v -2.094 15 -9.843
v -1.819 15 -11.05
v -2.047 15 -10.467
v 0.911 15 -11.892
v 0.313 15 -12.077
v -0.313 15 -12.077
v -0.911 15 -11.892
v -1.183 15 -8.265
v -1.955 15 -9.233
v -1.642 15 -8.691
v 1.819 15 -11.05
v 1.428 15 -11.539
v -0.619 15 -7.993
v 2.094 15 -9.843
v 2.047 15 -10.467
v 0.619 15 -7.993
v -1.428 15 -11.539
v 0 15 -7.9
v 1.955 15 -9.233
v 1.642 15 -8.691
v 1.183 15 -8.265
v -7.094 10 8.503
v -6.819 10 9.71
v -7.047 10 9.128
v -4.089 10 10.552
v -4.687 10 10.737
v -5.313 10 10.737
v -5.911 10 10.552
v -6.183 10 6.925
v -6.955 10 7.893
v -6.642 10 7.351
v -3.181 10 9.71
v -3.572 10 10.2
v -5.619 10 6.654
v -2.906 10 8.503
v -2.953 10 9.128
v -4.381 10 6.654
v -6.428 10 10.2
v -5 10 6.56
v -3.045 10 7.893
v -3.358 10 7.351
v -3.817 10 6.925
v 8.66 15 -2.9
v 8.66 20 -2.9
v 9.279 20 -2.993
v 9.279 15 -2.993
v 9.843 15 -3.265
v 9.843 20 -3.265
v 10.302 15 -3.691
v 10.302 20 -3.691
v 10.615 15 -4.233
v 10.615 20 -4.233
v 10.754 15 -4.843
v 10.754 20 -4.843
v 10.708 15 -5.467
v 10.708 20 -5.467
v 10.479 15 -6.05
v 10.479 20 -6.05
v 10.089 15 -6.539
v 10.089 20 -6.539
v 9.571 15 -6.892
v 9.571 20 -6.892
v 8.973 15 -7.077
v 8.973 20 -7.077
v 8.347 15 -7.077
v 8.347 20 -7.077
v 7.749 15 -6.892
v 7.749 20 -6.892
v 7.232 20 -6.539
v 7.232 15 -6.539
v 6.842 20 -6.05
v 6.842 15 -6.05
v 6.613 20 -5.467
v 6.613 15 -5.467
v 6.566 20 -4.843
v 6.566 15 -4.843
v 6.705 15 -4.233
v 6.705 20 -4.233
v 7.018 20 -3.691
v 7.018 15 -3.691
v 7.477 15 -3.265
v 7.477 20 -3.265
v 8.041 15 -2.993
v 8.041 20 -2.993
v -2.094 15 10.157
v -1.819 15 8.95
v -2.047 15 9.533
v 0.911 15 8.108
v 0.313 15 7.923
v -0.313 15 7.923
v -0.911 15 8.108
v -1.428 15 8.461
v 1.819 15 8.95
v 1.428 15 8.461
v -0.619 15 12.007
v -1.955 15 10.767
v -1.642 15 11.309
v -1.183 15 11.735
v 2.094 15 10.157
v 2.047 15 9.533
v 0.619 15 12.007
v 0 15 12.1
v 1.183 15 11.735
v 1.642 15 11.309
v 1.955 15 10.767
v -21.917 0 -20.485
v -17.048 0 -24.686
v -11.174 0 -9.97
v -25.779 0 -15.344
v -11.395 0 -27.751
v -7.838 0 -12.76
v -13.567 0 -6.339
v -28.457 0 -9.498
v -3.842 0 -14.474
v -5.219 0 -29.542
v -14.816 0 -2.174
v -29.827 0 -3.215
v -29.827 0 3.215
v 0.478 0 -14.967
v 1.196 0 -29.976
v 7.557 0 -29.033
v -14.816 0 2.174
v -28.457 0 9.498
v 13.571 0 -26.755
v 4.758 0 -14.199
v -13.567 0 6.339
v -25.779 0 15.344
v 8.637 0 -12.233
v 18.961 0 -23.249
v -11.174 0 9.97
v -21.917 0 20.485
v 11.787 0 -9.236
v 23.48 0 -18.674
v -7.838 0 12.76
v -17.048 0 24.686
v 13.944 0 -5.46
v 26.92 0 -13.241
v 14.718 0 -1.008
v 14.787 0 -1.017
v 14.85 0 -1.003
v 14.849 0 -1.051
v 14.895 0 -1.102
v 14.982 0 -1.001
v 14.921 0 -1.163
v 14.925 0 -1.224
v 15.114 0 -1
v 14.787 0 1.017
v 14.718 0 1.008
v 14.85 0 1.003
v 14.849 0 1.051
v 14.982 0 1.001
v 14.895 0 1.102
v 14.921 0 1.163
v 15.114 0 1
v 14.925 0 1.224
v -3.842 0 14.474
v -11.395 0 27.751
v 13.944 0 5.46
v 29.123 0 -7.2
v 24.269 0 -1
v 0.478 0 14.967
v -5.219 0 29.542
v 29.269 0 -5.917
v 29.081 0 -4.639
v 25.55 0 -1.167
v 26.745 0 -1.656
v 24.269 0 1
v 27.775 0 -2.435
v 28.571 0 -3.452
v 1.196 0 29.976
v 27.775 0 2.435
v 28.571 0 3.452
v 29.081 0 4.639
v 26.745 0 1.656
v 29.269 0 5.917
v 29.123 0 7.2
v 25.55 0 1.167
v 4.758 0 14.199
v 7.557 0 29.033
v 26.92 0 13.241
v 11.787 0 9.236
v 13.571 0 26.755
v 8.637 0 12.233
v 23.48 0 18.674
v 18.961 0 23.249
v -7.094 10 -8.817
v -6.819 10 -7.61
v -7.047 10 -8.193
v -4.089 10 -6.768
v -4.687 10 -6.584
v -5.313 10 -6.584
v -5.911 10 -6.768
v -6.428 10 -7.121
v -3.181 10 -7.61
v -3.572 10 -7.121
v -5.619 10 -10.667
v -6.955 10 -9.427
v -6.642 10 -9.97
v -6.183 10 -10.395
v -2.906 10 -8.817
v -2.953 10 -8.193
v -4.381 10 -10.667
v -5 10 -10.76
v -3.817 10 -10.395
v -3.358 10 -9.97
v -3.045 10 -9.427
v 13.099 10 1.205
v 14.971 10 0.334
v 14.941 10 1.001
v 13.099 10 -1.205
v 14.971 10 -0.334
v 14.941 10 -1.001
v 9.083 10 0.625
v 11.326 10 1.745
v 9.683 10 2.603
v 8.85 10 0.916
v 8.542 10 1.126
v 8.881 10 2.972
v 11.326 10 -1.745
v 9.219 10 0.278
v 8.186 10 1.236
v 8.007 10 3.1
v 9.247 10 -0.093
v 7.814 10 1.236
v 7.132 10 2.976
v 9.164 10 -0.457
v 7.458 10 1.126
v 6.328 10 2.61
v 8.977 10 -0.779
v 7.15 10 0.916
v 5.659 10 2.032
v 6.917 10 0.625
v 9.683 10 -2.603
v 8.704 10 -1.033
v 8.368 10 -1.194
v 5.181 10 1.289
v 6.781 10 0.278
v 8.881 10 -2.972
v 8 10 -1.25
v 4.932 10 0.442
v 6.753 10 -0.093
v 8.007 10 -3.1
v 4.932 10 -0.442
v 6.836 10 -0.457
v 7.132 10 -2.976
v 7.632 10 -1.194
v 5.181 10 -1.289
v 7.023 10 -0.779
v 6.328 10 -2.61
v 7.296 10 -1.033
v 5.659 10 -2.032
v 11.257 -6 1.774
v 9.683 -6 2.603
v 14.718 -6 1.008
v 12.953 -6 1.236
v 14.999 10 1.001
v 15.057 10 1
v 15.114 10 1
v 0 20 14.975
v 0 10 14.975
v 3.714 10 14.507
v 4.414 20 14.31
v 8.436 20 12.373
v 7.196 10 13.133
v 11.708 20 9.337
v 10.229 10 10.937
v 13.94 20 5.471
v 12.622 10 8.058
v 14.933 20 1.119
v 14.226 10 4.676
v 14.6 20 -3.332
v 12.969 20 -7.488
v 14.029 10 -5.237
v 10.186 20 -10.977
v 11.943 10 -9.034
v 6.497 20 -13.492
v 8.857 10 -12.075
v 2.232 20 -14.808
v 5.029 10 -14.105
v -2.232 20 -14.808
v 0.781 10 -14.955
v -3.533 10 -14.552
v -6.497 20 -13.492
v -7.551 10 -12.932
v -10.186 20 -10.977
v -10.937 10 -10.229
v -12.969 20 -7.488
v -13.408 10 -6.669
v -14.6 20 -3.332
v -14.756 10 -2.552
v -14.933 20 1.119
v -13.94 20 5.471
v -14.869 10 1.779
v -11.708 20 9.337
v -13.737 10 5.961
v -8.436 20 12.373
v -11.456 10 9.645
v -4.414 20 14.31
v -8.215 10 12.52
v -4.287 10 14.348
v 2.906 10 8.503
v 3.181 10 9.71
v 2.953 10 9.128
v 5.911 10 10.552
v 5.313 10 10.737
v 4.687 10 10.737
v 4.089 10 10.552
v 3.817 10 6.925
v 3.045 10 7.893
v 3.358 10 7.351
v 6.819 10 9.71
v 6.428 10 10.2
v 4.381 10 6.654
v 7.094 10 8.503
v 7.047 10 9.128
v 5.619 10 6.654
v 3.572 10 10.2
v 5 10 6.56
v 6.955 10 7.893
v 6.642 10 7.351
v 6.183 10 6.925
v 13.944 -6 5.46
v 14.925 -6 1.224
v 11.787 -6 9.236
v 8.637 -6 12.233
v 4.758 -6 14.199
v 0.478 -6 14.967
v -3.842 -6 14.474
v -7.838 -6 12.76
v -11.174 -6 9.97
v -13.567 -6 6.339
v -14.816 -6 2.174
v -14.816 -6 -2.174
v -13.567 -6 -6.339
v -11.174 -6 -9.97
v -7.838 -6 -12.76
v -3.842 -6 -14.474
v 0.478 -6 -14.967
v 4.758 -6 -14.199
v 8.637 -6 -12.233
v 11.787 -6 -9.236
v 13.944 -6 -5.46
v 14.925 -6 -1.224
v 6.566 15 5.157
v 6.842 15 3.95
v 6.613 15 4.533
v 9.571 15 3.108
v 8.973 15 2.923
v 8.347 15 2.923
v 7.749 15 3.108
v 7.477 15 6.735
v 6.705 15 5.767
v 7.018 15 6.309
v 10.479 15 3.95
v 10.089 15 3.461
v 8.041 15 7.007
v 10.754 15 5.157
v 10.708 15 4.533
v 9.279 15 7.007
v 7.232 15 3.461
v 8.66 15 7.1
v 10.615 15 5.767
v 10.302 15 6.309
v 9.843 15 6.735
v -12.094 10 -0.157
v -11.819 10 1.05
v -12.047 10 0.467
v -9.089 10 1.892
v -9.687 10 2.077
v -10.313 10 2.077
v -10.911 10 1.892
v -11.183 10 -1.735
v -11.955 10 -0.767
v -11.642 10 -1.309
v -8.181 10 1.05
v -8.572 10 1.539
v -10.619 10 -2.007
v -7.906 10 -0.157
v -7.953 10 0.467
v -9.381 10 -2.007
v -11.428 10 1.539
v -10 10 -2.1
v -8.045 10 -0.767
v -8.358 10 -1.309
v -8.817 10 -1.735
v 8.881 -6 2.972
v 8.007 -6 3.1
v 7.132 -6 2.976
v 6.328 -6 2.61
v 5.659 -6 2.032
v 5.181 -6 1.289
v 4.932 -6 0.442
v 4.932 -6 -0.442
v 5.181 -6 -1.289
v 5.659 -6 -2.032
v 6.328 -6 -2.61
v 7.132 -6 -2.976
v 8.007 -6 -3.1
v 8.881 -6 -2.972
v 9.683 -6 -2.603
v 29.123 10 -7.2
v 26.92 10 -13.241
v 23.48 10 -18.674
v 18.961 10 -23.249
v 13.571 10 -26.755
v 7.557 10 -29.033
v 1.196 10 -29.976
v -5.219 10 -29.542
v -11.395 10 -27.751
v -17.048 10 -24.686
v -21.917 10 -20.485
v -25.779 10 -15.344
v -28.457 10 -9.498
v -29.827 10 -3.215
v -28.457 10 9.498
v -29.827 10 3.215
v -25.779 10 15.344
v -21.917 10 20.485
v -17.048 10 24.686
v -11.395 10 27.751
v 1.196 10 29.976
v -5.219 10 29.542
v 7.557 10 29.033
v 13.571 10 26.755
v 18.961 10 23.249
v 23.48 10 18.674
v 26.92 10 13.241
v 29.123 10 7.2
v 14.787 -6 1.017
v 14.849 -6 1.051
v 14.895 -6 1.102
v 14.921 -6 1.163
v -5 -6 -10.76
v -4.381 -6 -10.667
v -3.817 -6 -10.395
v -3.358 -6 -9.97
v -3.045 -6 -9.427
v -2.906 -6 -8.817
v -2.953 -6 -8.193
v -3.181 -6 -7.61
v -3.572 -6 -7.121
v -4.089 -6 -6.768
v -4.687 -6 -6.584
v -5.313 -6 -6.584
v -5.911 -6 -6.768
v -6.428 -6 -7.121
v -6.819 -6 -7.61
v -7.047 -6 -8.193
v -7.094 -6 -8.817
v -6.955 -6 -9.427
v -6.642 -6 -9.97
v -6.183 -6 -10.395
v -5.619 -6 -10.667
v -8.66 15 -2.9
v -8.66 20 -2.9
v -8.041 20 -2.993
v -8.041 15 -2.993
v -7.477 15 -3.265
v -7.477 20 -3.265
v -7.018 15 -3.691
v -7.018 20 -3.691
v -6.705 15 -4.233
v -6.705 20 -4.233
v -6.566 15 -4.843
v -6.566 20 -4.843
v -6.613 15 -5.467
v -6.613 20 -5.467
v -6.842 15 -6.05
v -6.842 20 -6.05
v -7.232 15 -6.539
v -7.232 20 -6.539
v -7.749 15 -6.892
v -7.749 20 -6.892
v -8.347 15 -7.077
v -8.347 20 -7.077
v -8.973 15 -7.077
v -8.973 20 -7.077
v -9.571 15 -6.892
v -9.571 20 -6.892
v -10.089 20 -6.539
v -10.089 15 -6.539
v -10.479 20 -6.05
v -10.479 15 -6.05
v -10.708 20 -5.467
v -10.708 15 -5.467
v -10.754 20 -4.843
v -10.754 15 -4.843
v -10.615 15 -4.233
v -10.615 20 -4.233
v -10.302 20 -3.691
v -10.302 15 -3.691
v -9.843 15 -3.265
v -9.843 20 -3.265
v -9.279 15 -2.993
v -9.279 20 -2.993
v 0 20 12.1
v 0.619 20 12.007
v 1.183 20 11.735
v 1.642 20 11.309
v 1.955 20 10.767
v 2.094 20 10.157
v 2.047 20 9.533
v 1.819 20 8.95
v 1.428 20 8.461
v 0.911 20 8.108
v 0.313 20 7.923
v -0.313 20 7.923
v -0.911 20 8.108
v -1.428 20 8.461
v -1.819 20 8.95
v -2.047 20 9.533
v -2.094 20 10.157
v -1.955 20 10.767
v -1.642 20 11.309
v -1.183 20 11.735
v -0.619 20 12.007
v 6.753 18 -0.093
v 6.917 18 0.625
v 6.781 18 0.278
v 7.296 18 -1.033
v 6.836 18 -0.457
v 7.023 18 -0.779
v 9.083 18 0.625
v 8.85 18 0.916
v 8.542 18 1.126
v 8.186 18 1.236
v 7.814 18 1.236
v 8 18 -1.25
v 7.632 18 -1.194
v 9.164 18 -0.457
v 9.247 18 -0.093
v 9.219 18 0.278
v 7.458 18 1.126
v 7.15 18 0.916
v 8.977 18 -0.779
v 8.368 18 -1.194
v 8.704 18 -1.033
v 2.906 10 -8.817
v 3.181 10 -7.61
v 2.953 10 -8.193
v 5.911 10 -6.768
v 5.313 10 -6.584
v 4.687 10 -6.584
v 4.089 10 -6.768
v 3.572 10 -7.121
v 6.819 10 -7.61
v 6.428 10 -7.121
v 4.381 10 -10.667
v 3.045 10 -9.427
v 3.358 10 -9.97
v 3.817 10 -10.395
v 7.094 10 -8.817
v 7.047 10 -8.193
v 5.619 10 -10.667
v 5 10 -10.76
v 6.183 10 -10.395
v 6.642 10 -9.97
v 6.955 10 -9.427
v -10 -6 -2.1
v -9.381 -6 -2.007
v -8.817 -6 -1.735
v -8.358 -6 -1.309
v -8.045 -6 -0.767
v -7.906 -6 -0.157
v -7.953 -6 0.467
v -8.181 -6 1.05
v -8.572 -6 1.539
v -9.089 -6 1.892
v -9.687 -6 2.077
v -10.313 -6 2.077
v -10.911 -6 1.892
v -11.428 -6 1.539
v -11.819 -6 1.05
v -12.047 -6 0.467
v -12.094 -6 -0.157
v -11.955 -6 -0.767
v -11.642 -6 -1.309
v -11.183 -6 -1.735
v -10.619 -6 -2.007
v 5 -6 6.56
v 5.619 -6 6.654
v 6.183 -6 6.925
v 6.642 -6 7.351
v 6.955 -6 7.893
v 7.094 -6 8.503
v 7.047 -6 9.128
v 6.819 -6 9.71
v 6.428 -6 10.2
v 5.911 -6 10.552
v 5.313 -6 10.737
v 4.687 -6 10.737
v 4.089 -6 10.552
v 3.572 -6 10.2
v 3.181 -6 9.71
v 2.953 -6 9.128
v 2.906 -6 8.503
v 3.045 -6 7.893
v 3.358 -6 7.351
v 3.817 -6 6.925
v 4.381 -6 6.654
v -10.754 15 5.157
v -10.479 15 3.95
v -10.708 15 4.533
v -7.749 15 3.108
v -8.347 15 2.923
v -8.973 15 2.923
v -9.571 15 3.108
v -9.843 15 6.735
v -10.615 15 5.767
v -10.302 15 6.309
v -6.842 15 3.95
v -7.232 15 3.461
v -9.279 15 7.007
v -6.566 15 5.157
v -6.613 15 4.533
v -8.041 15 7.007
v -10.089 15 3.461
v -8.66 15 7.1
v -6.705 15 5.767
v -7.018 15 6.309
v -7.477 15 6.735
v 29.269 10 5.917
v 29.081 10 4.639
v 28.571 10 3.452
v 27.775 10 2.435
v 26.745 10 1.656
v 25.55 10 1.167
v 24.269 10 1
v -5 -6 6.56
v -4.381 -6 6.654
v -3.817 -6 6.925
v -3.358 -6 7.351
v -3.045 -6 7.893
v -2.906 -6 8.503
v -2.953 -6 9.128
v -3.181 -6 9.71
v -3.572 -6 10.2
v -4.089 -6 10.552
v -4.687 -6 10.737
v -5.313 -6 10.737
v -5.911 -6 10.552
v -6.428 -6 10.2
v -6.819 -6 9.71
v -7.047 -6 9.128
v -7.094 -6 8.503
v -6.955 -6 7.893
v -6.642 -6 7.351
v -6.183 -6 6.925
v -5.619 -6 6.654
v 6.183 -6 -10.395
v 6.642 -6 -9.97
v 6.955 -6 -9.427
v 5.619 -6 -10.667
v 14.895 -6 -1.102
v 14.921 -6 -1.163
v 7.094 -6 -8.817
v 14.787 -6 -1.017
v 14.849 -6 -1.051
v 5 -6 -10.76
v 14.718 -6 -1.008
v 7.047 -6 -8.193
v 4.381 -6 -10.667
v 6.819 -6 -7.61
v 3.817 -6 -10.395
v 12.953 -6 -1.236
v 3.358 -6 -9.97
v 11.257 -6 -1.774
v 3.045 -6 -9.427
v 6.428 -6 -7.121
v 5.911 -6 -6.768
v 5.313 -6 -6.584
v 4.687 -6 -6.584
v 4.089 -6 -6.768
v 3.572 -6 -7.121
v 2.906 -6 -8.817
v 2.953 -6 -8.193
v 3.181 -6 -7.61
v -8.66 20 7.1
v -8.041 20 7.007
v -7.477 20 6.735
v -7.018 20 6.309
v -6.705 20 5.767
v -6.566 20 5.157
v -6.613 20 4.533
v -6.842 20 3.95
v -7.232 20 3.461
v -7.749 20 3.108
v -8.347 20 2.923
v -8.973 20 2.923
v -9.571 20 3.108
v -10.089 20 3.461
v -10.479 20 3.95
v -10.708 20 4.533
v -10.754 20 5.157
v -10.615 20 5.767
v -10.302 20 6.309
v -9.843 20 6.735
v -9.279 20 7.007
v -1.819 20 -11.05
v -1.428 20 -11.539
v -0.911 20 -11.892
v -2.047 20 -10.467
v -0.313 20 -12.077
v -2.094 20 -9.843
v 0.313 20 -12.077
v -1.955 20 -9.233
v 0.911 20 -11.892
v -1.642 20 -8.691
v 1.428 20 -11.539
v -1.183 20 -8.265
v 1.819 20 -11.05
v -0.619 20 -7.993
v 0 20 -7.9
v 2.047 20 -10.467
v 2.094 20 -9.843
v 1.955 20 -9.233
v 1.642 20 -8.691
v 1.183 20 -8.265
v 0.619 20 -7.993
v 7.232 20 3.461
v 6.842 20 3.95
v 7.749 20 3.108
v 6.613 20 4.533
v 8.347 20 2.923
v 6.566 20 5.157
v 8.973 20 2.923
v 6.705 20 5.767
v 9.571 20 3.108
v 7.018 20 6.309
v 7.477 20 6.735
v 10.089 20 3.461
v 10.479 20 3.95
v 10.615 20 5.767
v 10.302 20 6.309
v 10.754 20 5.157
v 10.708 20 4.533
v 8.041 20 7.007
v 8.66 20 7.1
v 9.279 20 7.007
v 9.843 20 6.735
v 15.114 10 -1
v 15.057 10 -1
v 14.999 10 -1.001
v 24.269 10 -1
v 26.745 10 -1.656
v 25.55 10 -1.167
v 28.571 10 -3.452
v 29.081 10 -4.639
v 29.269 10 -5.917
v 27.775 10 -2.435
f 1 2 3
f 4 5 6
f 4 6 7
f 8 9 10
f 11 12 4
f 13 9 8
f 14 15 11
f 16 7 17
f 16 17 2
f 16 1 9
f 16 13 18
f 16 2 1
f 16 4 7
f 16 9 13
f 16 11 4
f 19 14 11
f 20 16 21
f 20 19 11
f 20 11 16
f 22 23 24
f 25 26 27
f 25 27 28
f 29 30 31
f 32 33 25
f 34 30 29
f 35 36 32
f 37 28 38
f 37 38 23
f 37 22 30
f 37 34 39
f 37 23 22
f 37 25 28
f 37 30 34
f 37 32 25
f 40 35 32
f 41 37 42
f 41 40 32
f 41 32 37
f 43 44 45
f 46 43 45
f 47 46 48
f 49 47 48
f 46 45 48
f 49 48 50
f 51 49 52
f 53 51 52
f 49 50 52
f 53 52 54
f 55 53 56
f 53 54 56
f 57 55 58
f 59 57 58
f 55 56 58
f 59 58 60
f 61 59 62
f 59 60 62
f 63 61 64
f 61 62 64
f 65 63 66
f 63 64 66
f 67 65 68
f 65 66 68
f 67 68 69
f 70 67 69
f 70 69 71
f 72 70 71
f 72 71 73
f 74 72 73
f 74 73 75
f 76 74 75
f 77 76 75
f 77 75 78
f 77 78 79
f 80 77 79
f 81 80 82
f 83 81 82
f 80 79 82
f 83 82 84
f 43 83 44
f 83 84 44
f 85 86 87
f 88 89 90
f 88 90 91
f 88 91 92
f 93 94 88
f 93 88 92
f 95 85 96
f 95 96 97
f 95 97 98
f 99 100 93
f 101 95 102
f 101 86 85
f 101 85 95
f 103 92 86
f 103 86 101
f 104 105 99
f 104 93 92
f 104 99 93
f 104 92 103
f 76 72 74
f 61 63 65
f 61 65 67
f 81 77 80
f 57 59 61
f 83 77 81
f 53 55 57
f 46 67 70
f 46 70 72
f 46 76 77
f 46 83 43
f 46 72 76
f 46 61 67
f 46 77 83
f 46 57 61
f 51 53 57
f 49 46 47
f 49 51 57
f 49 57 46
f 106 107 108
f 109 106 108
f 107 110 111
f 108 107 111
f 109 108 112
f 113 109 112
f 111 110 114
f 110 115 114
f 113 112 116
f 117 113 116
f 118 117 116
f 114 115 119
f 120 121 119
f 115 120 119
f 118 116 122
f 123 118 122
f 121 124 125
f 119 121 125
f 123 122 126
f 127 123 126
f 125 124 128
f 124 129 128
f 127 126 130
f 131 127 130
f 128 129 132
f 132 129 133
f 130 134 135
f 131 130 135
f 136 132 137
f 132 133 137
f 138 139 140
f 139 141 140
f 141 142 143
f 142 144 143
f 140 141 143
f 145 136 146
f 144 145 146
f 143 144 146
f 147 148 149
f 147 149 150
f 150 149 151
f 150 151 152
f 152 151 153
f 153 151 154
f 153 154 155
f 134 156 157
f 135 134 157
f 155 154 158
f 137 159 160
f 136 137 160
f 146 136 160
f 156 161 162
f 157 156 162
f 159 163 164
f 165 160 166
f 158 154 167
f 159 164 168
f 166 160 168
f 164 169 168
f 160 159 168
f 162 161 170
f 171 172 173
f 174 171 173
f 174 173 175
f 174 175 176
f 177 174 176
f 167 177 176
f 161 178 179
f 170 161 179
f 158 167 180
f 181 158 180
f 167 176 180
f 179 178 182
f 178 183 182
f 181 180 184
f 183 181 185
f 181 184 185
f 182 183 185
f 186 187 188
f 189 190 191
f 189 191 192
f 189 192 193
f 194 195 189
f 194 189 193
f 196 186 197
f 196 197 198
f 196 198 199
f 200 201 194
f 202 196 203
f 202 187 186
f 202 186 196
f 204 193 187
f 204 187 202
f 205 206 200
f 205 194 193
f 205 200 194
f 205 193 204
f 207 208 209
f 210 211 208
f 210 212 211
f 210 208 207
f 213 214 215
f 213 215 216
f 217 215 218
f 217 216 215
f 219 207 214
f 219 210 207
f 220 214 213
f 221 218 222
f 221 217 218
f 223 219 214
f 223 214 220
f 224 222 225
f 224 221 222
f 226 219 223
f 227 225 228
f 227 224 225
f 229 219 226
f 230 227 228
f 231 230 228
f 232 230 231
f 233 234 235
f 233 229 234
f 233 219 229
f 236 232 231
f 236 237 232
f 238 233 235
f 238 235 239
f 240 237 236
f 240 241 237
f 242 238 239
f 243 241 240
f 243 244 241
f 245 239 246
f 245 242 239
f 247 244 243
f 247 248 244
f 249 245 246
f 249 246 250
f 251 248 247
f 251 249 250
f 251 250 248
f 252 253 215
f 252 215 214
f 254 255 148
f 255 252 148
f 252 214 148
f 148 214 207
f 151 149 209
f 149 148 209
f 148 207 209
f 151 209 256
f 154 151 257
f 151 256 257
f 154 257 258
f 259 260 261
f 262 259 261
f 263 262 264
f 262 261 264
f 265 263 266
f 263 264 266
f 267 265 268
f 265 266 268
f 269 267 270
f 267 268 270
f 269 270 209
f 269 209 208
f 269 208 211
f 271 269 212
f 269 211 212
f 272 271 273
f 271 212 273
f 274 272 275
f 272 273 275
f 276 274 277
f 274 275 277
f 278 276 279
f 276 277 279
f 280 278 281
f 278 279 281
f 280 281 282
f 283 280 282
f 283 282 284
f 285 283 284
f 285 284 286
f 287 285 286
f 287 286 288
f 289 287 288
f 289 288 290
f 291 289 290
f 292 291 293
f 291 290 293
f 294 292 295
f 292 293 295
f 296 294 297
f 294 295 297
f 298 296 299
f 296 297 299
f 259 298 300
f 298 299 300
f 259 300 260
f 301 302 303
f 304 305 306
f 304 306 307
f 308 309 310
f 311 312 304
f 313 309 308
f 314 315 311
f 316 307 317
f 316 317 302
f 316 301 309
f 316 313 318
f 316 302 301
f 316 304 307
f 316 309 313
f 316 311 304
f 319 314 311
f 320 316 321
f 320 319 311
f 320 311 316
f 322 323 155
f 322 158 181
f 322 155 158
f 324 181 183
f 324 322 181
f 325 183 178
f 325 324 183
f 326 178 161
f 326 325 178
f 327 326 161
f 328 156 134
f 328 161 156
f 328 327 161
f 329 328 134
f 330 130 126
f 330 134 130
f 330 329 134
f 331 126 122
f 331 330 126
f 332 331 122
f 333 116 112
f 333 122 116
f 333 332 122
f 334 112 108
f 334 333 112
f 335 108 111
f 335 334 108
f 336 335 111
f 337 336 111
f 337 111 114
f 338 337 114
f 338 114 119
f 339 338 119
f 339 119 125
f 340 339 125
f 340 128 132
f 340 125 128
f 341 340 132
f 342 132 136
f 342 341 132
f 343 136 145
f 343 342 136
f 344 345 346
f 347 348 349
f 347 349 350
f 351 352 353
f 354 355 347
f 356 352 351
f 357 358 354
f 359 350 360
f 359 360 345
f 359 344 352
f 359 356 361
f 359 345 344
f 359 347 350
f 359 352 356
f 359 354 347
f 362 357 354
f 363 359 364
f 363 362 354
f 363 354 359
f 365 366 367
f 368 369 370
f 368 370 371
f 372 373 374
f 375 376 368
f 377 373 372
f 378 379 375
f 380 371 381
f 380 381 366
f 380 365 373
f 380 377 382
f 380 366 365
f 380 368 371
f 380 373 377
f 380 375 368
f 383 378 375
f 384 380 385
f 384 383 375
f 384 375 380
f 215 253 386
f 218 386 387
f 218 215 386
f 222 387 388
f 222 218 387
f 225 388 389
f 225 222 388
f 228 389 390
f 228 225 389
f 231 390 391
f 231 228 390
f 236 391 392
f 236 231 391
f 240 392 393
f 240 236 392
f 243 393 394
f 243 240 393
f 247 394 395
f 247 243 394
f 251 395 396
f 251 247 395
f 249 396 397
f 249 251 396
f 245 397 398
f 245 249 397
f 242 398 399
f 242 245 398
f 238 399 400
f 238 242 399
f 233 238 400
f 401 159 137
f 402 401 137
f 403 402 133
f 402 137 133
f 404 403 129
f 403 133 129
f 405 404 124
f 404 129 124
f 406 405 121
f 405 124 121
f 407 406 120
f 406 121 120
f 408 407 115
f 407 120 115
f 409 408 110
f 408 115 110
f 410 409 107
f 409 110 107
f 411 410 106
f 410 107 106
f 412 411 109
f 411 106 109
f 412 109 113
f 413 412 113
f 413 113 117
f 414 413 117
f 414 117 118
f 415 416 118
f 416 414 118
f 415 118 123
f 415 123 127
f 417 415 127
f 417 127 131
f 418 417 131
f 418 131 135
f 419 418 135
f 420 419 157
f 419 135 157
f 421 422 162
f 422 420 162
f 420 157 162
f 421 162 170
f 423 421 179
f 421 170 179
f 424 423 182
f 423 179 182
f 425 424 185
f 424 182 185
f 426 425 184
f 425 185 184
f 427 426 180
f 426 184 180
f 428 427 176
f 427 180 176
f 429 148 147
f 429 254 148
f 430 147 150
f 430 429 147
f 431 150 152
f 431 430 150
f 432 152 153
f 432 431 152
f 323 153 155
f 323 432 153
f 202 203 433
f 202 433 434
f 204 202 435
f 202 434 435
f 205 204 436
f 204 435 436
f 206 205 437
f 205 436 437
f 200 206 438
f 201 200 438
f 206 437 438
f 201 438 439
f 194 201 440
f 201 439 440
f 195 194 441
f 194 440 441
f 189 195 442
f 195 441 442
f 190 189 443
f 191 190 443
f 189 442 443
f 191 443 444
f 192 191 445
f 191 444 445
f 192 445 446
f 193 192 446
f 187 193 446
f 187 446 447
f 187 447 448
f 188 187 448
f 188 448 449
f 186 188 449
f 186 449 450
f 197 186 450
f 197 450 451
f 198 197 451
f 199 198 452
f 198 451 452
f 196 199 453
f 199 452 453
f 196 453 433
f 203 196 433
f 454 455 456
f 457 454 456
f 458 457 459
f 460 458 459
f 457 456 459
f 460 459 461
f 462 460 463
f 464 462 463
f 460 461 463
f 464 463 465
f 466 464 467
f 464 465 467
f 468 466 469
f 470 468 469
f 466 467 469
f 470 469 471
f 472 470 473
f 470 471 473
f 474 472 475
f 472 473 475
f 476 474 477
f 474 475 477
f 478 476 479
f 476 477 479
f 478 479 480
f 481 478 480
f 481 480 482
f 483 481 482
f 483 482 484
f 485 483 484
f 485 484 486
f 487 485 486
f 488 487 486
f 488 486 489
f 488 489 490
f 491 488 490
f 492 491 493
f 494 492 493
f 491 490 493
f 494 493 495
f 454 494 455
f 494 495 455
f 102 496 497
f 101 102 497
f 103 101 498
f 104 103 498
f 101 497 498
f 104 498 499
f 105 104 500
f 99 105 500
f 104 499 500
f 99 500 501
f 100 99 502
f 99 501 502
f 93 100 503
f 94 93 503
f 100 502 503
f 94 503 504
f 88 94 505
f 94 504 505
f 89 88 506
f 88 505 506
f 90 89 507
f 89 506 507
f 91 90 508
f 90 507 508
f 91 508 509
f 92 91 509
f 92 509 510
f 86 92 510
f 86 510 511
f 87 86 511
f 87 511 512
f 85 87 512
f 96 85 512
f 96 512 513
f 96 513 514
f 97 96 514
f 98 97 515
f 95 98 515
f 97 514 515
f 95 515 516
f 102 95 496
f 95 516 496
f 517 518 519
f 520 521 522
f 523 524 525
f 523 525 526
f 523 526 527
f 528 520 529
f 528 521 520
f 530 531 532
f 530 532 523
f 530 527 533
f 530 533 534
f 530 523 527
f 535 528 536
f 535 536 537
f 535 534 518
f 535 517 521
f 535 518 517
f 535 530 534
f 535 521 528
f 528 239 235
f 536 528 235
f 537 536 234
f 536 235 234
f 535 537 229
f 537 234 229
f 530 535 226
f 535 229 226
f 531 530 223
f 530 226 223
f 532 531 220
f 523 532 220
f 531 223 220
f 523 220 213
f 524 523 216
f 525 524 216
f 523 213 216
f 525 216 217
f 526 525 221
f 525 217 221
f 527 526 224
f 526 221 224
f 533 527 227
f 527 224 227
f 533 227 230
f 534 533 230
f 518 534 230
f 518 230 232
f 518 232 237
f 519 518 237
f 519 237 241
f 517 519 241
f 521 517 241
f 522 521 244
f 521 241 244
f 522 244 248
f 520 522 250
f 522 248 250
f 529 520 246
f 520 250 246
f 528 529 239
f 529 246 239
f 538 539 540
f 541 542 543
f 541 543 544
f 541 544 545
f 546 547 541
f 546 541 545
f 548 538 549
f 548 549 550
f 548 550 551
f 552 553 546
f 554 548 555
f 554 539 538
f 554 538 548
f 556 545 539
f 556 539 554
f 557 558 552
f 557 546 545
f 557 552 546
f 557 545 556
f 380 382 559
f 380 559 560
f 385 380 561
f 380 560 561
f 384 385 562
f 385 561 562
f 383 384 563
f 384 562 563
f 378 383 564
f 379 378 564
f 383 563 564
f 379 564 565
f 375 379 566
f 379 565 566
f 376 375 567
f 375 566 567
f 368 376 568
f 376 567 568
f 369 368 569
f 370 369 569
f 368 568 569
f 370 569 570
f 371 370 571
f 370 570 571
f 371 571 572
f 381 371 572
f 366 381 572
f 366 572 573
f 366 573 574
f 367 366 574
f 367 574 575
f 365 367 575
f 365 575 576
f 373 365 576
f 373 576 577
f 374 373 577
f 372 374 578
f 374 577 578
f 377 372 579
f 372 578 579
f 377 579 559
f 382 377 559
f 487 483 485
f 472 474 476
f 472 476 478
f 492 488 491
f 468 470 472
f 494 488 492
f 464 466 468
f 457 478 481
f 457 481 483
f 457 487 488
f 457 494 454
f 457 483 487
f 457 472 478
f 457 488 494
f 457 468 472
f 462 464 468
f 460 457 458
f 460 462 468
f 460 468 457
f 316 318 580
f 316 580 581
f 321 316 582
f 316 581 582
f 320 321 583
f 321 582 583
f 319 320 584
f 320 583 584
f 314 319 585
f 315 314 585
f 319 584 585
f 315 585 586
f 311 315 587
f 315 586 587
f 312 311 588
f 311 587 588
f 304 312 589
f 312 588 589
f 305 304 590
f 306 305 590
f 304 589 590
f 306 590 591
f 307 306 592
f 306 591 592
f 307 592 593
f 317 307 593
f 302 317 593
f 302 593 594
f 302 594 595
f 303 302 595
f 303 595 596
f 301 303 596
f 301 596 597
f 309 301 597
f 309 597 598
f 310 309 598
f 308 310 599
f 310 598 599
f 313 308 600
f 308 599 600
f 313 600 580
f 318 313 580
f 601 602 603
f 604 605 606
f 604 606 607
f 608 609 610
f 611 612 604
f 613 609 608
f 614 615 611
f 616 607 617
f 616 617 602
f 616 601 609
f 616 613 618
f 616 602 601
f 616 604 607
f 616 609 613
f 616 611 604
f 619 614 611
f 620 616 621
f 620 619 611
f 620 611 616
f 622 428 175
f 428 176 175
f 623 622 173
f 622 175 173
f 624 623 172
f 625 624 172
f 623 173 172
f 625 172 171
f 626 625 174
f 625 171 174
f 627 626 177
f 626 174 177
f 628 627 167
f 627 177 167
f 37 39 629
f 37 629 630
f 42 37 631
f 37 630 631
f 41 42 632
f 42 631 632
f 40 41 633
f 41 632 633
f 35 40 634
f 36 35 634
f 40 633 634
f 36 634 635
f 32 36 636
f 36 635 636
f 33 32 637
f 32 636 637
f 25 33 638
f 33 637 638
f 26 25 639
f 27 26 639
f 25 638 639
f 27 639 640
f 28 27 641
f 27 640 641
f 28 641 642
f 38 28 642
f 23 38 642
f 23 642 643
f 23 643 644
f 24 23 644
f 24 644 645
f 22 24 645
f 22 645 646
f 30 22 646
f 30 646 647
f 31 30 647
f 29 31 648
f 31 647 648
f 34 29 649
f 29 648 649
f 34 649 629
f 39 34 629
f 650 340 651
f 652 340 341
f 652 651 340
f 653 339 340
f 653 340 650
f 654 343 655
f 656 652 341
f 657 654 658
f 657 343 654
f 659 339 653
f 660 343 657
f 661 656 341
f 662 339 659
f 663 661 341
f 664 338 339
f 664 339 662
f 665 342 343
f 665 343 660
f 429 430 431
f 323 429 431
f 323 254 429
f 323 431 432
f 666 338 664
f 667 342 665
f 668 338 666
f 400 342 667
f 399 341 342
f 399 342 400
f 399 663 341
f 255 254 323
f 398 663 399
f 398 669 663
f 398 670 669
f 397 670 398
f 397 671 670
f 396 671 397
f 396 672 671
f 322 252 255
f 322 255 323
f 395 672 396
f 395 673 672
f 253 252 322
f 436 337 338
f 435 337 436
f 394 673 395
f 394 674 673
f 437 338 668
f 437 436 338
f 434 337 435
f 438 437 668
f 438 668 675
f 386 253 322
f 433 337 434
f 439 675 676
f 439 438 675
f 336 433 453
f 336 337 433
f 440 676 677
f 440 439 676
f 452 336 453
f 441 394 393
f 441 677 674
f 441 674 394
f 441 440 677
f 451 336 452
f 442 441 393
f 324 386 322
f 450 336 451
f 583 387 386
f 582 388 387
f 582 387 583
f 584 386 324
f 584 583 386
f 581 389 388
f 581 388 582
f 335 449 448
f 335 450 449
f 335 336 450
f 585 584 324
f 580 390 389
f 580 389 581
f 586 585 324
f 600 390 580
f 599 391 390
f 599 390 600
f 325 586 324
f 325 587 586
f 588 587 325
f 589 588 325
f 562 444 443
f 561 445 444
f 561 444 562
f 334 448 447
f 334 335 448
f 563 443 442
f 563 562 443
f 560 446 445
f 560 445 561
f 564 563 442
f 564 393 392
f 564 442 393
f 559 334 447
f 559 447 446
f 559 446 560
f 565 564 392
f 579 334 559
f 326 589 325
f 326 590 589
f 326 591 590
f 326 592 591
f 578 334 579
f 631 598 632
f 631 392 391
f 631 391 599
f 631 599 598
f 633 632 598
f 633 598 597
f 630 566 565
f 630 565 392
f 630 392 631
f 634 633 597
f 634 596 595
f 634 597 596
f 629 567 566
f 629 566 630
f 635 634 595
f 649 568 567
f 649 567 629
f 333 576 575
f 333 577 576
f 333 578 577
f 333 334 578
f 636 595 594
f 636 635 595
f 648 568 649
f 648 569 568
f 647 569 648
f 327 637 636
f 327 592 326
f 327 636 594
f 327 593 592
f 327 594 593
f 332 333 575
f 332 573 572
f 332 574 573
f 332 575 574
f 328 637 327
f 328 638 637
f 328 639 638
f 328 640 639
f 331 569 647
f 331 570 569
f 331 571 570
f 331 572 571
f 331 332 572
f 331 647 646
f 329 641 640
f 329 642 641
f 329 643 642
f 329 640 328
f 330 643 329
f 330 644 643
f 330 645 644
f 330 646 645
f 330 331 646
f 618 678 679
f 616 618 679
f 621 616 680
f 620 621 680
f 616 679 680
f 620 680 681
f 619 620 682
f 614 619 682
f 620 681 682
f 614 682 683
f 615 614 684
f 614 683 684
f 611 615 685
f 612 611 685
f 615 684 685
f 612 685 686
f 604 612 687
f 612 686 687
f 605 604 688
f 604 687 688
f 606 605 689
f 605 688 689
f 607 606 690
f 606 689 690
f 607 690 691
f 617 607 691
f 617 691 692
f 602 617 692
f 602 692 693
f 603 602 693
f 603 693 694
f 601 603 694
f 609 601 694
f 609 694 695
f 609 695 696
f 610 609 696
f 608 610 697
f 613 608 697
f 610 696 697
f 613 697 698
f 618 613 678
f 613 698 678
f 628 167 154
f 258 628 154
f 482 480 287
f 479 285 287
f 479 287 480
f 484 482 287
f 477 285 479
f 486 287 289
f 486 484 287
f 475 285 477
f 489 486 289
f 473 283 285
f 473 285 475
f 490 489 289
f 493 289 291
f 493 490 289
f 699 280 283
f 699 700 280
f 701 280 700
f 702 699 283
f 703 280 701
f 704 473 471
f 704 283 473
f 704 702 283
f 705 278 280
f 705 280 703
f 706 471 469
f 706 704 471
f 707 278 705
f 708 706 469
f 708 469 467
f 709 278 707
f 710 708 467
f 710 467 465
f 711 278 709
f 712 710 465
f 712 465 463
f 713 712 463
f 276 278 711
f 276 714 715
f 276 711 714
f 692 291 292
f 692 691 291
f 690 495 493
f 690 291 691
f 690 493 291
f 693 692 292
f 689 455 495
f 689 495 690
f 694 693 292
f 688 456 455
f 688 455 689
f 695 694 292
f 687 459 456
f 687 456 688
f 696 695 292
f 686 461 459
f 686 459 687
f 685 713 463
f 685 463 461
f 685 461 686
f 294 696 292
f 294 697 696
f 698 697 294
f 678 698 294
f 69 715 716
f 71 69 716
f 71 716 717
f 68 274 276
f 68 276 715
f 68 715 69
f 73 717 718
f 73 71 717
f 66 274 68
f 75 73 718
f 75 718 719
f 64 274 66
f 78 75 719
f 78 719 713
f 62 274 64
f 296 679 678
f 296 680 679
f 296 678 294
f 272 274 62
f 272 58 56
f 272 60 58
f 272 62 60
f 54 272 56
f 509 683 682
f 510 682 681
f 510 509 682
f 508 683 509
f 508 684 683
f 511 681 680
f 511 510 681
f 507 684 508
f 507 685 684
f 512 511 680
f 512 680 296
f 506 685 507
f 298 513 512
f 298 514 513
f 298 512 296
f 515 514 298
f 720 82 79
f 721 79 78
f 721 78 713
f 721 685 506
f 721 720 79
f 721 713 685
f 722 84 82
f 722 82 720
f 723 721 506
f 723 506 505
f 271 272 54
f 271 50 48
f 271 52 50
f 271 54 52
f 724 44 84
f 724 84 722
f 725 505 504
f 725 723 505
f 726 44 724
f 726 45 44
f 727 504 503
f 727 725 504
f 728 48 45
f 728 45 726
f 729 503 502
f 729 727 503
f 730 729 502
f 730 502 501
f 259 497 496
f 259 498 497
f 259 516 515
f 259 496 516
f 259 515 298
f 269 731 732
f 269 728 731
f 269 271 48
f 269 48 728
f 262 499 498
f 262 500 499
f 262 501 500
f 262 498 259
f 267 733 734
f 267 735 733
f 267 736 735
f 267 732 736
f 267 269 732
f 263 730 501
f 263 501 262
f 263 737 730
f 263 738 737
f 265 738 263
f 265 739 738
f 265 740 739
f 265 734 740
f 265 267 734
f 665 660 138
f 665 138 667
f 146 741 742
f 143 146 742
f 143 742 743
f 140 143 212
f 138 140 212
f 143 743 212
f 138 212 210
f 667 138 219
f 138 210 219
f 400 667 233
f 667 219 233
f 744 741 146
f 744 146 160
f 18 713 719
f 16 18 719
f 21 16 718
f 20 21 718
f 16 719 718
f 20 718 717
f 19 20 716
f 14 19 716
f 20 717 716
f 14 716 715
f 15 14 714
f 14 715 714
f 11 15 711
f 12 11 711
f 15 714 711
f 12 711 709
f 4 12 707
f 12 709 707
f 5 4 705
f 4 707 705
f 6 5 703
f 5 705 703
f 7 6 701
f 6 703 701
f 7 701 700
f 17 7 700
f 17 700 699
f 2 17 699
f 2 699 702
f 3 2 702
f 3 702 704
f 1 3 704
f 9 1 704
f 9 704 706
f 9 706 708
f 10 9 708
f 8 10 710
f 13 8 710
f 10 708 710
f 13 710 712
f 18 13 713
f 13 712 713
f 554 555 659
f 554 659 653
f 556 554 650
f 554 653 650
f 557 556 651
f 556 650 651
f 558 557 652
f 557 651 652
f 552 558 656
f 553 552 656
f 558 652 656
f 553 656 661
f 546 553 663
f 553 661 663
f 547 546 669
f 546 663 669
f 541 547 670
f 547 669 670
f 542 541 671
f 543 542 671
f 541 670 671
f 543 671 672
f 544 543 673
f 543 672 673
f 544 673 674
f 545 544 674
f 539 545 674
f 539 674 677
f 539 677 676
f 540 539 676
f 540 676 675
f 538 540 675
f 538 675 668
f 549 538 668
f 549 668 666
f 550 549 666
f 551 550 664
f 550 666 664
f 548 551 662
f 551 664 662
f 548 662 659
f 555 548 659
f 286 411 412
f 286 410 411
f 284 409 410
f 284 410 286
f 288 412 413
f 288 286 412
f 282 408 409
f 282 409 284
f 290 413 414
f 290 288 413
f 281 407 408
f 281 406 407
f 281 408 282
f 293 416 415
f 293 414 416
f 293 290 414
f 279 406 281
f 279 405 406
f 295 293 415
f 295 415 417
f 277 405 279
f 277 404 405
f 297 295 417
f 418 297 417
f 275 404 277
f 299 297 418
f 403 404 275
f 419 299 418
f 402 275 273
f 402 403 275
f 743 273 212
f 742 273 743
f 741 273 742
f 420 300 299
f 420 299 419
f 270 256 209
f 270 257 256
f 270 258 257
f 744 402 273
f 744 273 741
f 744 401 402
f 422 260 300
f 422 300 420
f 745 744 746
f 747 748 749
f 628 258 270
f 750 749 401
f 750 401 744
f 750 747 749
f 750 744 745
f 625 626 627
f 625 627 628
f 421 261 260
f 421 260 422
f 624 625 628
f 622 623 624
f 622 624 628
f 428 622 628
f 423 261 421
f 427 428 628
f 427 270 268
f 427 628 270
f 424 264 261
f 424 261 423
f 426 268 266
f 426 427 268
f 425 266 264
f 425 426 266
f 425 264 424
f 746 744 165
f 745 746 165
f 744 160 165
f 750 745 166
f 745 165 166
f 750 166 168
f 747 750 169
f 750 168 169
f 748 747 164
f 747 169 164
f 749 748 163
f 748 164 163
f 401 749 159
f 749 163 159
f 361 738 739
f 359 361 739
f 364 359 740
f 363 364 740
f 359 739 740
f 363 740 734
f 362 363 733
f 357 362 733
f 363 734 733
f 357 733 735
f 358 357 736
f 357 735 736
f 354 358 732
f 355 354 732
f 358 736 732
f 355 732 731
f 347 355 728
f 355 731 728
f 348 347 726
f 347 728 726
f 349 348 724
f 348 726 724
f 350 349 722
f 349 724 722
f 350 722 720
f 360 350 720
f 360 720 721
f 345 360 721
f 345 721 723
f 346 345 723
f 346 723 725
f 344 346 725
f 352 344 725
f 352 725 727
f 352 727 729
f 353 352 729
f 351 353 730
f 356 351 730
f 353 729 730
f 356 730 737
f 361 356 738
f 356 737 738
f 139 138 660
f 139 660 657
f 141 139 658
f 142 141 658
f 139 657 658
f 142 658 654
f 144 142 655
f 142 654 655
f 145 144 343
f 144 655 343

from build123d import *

# Parameters (mm, degrees)
SKETCH_1_R          = 30
EXTRUDE_1_DEPTH     = 10
SKETCH_2_R          = 14.975
EXTRUDE_2_DEPTH     = 10
EXTRUDE_START       = 6
SKETCH_3_R          = 14.975
EXTRUDE_3_DEPTH     = 6
SKETCH_4_R          = 2.1
CUT_EXTRUDE_1_DEPTH = 16
CUT_EXTRUDE_3_DEPTH = 46.343136195
FILLET_1_R          = 10
FILLET_2_R          = 5
FILLET_3_R          = 0.2
SKETCH_7_R          = 1.25
CUT_EXTRUDE_4_DEPTH = 8
SKETCH_8_R          = 2.1
CUT_EXTRUDE_5_DEPTH = 5


with BuildPart() as part:
    # 草图1 → 凸台-拉伸1 (new body)
    with BuildSketch(Plane(origin=(0, 0, 0), x_dir=(1, 0, 0), z_dir=(0, 1, 0))):
        with Locations(Location((0, 0, 0), (0, 0, 270))):
            Circle(SKETCH_1_R)
    extrude(amount=EXTRUDE_1_DEPTH)

    # 草图2 → 凸台-拉伸2 (add)
    with BuildSketch(Plane(origin=(0, 10, 0), x_dir=(1, 0, 0), z_dir=(0, 1, 0))):
        with Locations(Location((0, 0, 0), (0, 0, 270))):
            Circle(SKETCH_2_R)
    extrude(amount=EXTRUDE_2_DEPTH)

    # 草图3 → 凸台-拉伸3 (add)
    with BuildSketch(Plane.XZ.offset(EXTRUDE_START)):
        with Locations(Location((0, 0, 0), (0, 0, 90))):
            Circle(SKETCH_3_R)
    extrude(amount=-EXTRUDE_3_DEPTH)

    # 草图4 → 切除-拉伸1 (cut)
    with BuildSketch(Plane.XZ.offset(6)):
        with Locations(Location((-10, 0, 0), (0, 0, 270))):
            Circle(SKETCH_4_R)
        with Locations(Location((-5, 8.660254038, 0), (0, 0, 270))):
            Circle(SKETCH_4_R)
        with Locations(Location((5, 8.660254038, 0), (0, 0, 270))):
            Circle(SKETCH_4_R)
        with Locations(Location((5, -8.660254038, 0), (0, 0, 270))):
            Circle(SKETCH_4_R)
        with Locations(Location((-5, -8.660254038, 0), (0, 0, 270))):
            Circle(SKETCH_4_R)
    extrude(amount=-CUT_EXTRUDE_1_DEPTH, mode=Mode.SUBTRACT)

    # 草图6 → 切除-拉伸3 (cut, through all)
    with BuildSketch(Plane(origin=(0, 10, 0), x_dir=(1, 0, 0), z_dir=(0, 1, 0))):
        with BuildLine():
            Line((10.93428015, 1), (30.93428015, 1))
            Line((30.93428015, 1), (30.93428015, -1))
            Line((30.93428015, -1), (10.93428015, -1))
            ThreePointArc((10.93428015, -1), (4.9, 0), (10.93428015, 1))
        make_face()
    extrude(amount=-CUT_EXTRUDE_3_DEPTH, mode=Mode.SUBTRACT)

    # 圆角1
    # the kernel refuses this fillet: 10 mm, written as the material it takes off along each edge
    with BuildSketch(Plane(origin=(10.93428015, 10, -1), x_dir=(1, 0, 0), z_dir=(0, -1, 0))) as fillet_1_piece_1:
        with BuildLine():
            CenterArc((4.179790415, -10), FILLET_1_R, 90, 32.892109865)
            ThreePointArc((-1.250797803, -1.603053435), (-0.490230703, -0.906992999), (0, 0))
            Line((0, 0), (4.179790415, 0))
        make_face()
    extrude(amount=26.449476036, mode=Mode.SUBTRACT)
    with BuildSketch(Plane(origin=(10.93428015, 10, 1), x_dir=(1, 0, 0), z_dir=(0, -1, 0))) as fillet_1_piece_2:
        with BuildLine():
            CenterArc((4.179790415, 10), FILLET_1_R, 237.107890135, 32.892109865)
            ThreePointArc((-1.250797803, 1.603053435), (-0.490230703, 0.906992999), (0, 0))
            Line((0, 0), (4.179790415, 0))
        make_face()
    extrude(amount=26.449476036, mode=Mode.SUBTRACT)

    # 圆角2
    fillet_2_edges = [part.edges().sort_by_distance(p)[0] for p in [
        (29.983328701, 5, -1),
        (29.983328701, 5, 1),
    ]]
    fillet(fillet_2_edges, radius=FILLET_2_R)

    # 圆角3
    fillet_3_edges = [part.edges().sort_by_distance(p)[0] for p in [
        (14.941473943, -3, 1.001489591),
        (14.941473943, -3, -1.001489591),
    ]]
    fillet(fillet_3_edges, radius=FILLET_3_R)

    # 草图7 → 切除-拉伸4 (cut)
    with BuildSketch(Plane.XZ.offset(-10)):
        with Locations(Location((8, 0, 0), (0, 0, 270))):
            Circle(SKETCH_7_R)
    extrude(amount=-CUT_EXTRUDE_4_DEPTH, mode=Mode.SUBTRACT)

    # 草图8 → 切除-拉伸5 (cut)
    with BuildSketch(Plane(origin=(0, 20, 0), x_dir=(1, 0, 0), z_dir=(0, 1, 0))):
        with Locations(Location((-8.660254038, 5, 0), (0, 0, 270))):
            Circle(SKETCH_8_R)
        with Locations(Location((0, 10, 0), (0, 0, 270))):
            Circle(SKETCH_8_R)
        with Locations(Location((8.660254038, 5, 0), (0, 0, 270))):
            Circle(SKETCH_8_R)
        with Locations(Location((8.660254038, -5, 0), (0, 0, 270))):
            Circle(SKETCH_8_R)
        with Locations(Location((0, -10, 0), (0, 0, 270))):
            Circle(SKETCH_8_R)
        with Locations(Location((-8.660254038, -5, 0), (0, 0, 270))):
            Circle(SKETCH_8_R)
    extrude(amount=-CUT_EXTRUDE_5_DEPTH, mode=Mode.SUBTRACT)


solid = part.part
